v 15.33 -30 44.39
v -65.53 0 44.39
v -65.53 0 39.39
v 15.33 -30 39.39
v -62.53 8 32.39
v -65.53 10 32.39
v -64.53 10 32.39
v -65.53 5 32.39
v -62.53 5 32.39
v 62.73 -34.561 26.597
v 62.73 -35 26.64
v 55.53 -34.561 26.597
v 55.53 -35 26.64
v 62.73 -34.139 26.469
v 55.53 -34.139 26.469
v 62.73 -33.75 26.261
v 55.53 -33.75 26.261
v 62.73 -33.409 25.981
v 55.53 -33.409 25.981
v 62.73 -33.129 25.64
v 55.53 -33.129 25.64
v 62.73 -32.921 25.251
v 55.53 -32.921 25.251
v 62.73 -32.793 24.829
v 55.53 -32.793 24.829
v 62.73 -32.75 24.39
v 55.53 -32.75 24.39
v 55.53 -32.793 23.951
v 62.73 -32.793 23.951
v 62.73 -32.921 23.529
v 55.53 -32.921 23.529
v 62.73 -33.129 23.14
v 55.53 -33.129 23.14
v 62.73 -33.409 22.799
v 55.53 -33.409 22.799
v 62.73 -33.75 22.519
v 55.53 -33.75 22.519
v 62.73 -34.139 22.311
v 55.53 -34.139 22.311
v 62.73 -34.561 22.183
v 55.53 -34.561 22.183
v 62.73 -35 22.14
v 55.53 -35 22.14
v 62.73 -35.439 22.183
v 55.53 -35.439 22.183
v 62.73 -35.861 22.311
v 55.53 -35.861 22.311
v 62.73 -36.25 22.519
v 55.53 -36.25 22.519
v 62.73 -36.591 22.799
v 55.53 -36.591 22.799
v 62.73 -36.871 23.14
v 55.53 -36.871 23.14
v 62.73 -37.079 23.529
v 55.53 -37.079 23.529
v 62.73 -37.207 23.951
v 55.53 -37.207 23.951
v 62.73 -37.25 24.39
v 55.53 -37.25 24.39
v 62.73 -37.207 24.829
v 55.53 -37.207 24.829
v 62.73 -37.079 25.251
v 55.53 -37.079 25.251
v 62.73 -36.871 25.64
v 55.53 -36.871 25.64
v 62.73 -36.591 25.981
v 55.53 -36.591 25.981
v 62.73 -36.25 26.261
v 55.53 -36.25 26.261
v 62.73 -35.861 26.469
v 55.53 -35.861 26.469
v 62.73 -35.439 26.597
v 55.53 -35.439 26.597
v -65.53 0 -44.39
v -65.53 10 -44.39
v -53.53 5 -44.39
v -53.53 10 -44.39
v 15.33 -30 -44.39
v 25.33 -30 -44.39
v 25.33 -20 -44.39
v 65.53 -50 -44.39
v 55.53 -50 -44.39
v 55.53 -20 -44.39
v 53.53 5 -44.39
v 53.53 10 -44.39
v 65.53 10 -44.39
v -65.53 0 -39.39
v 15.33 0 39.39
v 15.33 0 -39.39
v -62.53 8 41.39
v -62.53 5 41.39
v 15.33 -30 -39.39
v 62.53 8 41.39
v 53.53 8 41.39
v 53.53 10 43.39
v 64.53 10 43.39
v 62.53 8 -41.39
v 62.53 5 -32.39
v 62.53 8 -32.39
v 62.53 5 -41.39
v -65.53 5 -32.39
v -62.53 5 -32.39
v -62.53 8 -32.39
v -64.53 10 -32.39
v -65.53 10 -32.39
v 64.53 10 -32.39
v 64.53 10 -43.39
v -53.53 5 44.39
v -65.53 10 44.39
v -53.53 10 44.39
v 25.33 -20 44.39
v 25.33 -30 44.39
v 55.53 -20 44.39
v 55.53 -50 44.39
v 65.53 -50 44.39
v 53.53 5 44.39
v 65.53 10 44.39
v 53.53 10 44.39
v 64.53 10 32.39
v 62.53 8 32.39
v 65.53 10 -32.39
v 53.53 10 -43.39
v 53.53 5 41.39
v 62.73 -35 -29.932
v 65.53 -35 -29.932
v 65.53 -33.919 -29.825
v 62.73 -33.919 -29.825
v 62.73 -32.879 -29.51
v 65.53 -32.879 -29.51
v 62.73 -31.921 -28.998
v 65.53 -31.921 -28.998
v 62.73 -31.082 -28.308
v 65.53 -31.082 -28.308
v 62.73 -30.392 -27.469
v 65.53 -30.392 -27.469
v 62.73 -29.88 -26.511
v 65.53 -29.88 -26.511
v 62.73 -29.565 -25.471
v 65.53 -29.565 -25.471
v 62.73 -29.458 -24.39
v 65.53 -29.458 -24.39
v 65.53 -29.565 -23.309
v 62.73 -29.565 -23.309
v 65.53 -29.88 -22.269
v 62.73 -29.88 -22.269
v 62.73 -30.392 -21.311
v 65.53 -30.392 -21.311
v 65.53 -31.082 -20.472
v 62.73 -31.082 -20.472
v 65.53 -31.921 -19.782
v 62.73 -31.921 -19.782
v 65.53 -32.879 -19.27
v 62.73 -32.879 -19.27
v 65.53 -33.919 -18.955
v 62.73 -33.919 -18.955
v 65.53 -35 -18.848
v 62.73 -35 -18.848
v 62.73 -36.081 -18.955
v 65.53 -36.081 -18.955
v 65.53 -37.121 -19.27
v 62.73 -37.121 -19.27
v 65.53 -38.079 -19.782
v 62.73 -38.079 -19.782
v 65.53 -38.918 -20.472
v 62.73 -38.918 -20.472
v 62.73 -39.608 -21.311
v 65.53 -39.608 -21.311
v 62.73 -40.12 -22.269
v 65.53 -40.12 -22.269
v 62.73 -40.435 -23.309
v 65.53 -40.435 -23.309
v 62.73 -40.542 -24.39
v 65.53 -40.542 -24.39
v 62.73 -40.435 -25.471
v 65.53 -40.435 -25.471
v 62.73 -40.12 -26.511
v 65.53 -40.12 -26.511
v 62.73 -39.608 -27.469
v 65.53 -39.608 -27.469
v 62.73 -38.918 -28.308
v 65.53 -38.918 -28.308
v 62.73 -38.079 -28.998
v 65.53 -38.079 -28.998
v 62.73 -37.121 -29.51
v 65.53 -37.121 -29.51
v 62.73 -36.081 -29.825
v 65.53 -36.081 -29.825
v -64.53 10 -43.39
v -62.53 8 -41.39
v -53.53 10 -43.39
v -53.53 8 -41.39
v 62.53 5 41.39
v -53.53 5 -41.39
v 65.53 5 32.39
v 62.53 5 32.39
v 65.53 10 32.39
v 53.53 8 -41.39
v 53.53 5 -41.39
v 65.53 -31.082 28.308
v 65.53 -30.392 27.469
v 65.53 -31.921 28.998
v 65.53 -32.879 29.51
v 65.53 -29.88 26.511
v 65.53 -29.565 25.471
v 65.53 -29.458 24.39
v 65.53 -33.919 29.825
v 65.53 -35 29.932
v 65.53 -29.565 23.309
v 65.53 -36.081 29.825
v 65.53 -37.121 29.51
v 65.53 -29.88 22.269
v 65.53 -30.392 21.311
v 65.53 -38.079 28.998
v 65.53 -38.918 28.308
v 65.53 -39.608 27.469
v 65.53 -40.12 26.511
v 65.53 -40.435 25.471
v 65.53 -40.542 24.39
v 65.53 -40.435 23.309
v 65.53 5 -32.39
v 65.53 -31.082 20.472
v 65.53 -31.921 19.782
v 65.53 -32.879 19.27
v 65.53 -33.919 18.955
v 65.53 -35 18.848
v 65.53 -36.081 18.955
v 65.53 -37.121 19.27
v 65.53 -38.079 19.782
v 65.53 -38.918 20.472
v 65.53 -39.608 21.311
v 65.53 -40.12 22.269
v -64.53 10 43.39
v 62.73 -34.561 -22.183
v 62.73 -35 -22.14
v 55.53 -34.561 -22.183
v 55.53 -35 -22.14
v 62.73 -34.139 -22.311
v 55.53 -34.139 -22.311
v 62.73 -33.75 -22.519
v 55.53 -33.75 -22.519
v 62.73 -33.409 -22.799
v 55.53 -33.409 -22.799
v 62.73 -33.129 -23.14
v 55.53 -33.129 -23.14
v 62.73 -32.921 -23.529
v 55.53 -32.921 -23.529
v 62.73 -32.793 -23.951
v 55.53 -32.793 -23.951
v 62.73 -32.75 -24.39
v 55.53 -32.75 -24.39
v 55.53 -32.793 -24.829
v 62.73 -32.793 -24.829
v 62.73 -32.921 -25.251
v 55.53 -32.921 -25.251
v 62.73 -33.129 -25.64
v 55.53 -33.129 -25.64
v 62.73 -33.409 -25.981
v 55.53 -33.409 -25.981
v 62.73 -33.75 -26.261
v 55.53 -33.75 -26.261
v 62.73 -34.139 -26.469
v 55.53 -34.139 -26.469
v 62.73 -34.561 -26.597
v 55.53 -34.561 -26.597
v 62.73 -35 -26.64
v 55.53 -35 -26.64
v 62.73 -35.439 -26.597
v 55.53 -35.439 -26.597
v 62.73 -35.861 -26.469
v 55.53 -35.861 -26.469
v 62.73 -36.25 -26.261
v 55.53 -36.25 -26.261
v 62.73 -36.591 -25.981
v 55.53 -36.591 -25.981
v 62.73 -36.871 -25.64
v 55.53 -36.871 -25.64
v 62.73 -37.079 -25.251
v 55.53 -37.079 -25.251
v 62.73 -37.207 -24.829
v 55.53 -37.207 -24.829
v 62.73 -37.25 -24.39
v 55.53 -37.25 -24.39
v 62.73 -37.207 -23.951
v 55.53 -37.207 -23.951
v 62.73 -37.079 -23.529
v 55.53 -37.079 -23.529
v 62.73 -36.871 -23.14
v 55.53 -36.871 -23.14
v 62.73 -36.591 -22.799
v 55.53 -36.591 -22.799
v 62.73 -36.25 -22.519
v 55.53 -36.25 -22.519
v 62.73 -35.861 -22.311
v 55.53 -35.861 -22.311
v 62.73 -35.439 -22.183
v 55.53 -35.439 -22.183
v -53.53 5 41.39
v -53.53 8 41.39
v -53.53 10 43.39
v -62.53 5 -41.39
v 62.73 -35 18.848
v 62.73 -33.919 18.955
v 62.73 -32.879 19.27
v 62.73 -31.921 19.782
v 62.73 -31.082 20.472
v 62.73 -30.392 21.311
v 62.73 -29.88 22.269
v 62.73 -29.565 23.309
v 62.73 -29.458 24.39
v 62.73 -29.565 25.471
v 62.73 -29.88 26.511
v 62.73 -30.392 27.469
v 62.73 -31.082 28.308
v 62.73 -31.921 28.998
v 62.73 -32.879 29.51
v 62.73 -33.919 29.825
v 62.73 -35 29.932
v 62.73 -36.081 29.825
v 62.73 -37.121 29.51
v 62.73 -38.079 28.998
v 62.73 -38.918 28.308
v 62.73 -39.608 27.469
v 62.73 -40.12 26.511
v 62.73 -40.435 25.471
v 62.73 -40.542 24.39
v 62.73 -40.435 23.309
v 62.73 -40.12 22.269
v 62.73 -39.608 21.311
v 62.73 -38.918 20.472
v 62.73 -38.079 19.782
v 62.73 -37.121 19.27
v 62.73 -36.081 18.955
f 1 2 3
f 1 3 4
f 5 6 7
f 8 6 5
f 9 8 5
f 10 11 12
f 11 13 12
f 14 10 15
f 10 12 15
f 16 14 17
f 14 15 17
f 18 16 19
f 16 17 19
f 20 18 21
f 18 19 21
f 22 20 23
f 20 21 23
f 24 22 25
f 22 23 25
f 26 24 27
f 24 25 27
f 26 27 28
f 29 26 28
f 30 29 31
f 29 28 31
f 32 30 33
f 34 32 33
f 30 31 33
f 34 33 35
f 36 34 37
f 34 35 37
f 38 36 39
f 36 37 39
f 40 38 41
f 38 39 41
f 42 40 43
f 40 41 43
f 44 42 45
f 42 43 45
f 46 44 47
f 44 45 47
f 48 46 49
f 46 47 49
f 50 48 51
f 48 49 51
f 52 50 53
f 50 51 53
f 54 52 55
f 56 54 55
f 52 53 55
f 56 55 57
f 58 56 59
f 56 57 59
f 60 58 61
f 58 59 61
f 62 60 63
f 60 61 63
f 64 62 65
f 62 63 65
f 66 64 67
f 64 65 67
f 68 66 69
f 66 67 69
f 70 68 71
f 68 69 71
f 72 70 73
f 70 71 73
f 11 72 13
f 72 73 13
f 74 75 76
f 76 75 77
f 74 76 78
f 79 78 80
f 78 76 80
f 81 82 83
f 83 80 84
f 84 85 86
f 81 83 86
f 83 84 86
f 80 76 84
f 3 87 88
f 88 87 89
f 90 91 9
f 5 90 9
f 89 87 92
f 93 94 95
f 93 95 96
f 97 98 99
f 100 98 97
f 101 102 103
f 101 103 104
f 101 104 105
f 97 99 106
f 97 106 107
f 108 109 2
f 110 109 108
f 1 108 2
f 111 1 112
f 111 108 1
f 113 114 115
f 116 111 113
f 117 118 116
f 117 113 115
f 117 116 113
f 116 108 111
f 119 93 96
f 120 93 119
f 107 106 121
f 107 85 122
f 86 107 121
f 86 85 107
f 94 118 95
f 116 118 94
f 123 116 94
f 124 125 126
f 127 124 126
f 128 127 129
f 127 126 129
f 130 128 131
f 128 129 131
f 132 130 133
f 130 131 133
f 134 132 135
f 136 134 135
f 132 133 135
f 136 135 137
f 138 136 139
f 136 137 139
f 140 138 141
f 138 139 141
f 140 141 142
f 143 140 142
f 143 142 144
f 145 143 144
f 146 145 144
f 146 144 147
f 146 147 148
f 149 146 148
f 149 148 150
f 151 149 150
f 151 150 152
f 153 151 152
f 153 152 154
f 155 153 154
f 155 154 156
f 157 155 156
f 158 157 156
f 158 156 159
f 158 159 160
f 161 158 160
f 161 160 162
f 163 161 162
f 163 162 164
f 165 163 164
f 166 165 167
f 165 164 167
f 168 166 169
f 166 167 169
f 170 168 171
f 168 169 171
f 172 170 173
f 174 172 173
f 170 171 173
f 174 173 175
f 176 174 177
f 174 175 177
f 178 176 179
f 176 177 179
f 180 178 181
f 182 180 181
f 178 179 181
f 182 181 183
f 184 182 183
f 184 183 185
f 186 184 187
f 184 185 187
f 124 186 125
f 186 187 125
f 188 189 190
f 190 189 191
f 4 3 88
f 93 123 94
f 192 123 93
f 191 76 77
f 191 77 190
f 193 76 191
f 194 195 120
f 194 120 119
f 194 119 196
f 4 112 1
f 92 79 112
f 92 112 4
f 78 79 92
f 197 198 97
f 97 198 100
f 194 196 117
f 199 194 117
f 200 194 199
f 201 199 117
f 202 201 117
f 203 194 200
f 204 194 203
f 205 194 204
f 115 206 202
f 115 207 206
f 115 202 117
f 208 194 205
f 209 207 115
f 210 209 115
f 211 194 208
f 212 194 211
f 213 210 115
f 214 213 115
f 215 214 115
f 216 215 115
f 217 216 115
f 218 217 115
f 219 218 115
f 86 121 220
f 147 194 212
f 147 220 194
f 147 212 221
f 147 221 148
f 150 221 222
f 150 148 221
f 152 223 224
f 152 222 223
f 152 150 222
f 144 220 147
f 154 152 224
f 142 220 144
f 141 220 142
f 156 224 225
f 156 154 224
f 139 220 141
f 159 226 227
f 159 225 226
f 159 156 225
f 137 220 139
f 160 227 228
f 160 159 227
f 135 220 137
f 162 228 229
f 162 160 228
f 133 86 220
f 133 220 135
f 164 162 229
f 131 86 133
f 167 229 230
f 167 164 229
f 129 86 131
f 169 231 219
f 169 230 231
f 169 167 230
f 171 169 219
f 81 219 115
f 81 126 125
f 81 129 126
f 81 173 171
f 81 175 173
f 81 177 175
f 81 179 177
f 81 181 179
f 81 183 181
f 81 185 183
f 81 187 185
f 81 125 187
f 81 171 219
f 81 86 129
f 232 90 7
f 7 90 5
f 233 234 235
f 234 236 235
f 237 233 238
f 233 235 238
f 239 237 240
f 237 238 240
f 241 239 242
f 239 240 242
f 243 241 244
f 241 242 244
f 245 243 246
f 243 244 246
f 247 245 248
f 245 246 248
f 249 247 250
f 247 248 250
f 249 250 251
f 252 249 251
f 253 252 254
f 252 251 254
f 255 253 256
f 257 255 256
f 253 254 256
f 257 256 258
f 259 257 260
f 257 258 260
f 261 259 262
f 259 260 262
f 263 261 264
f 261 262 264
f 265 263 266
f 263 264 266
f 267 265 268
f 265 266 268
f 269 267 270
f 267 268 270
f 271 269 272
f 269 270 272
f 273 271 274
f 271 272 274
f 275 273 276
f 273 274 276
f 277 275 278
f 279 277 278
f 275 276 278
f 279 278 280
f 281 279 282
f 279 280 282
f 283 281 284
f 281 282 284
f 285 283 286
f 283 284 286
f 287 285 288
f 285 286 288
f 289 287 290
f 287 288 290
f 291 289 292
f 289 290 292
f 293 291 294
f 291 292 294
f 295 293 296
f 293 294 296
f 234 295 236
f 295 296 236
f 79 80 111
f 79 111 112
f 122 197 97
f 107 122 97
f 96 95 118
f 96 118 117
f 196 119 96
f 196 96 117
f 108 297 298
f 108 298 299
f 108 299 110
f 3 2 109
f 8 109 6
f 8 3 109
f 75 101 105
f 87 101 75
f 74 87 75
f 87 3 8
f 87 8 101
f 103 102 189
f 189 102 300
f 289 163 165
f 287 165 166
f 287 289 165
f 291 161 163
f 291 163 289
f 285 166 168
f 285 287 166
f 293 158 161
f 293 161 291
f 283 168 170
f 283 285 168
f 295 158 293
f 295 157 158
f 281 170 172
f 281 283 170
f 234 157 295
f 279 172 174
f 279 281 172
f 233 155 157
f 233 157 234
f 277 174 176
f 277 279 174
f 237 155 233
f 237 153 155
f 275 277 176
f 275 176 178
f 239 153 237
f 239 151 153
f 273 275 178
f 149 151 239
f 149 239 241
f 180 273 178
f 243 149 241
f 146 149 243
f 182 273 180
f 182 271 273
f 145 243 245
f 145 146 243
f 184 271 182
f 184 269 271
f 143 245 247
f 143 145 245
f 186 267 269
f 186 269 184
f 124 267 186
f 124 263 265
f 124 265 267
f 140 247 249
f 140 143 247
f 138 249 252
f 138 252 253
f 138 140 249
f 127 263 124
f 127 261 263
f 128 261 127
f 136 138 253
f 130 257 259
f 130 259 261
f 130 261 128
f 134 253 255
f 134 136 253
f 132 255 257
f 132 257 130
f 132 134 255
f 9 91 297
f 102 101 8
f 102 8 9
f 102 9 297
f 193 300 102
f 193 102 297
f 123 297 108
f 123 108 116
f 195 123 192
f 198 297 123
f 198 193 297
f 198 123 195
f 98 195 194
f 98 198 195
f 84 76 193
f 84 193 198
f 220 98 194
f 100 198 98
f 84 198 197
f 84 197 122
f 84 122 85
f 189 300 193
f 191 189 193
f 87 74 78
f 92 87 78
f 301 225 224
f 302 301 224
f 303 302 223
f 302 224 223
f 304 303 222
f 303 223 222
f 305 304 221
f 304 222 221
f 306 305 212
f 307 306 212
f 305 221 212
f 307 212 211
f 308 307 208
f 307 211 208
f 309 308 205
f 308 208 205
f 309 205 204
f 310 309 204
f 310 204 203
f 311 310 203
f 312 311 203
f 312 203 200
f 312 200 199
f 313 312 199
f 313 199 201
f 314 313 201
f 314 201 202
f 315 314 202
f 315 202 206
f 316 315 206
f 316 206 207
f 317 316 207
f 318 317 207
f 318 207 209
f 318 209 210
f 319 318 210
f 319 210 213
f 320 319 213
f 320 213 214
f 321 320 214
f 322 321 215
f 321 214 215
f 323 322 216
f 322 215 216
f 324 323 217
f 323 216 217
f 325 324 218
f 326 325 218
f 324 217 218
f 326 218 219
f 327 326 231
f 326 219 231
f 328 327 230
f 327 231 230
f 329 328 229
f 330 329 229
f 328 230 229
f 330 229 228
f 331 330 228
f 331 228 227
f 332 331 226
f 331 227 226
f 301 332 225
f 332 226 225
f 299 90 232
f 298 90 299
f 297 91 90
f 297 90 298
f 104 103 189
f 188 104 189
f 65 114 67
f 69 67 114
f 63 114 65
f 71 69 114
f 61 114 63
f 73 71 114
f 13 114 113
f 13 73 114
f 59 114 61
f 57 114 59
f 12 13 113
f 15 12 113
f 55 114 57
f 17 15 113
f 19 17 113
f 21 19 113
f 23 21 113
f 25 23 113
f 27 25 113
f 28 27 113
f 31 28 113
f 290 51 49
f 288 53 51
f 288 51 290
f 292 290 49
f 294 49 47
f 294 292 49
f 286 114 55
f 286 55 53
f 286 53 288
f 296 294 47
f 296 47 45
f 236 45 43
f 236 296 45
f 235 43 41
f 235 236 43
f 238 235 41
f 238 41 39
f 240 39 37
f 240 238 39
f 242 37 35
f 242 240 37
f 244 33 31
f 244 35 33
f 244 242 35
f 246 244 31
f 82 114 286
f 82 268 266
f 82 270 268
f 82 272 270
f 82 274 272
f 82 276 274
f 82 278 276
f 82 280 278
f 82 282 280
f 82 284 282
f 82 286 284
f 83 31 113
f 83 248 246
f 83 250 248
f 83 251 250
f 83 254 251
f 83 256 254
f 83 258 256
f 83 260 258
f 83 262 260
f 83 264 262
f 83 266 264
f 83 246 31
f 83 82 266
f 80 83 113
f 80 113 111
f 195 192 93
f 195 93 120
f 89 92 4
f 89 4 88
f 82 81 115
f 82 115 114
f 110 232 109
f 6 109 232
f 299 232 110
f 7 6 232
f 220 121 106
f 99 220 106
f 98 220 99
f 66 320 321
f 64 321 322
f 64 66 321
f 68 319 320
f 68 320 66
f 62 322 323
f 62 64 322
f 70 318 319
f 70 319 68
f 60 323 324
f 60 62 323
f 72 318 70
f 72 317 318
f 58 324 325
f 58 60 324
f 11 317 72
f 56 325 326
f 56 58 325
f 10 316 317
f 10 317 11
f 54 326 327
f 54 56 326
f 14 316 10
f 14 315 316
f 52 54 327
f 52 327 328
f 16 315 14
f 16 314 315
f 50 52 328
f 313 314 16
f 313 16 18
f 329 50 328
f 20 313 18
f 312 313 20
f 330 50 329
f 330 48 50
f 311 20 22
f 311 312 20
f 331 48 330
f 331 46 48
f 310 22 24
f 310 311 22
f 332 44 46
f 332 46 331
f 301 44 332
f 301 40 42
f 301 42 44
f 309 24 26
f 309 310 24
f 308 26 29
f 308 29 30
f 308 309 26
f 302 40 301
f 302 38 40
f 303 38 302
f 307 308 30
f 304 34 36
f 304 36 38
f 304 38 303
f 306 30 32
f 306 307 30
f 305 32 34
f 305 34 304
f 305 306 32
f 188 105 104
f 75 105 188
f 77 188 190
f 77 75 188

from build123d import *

# Parameters (mm, degrees)
SKETCH1_W                                    = 131.06
SKETCH1_H                                    = 88.78
BOSS_EXTRUDE1_DEPTH                          = 5
SKETCH2_W                                    = 131.06
SKETCH2_H                                    = 88.78
SKETCH2_W_2                                  = 125.06
SKETCH2_H_2                                  = 82.78
BOSS_EXTRUDE2_DEPTH                          = 5
CHAMFER1_SIZE                                = 2
CUT_EXTRUDE1_DEPTH                           = 80.307332574
BOSS_EXTRUDE3_START                          = -44.39
BOSS_EXTRUDE3_DEPTH                          = 88.78
BOSS_EXTRUDE4_DEPTH                          = 5
CBORE_FOR_M4_HEX_HEAD_CAP_SCREW1_D           = 4.5
CBORE_FOR_M4_HEX_HEAD_CAP_SCREW1_CBORE_D     = 11.083
CBORE_FOR_M4_HEX_HEAD_CAP_SCREW1_CBORE_DEPTH = 2.8


with BuildPart() as part:
    # Sketch1 → Boss-Extrude1 (new body)
    with BuildSketch(Plane(origin=(0, 0, 0), x_dir=(1, 0, 0), z_dir=(0, 1, 0))):
        Rectangle(SKETCH1_W, SKETCH1_H)
    extrude(amount=BOSS_EXTRUDE1_DEPTH)

    # Sketch2 → Boss-Extrude2 (add)
    with BuildSketch(Plane(origin=(0, 5, 0), x_dir=(1, 0, 0), z_dir=(0, 1, 0))):
        Rectangle(SKETCH2_W, SKETCH2_H)
        Rectangle(SKETCH2_W_2, SKETCH2_H_2, mode=Mode.SUBTRACT)
    extrude(amount=BOSS_EXTRUDE2_DEPTH)

    # Chamfer1
    chamfer1_edges = [part.edges().sort_by_distance(p)[0] for p in [
        (62.53, 10, 0),
        (0, 10, -41.39),
        (-62.53, 10, 0),
        (0, 10, 41.39),
    ]]
    chamfer(chamfer1_edges, length=CHAMFER1_SIZE)

    # Sketch3 → Cut-Extrude1 (cut, through all)
    with BuildSketch(Plane(origin=(0, 5, 0), x_dir=(1, 0, 0), z_dir=(0, 1, 0))):
        Polygon((-65.53, 32.39), (-65.53, -32.39), (-53.53, -32.39), (-53.53, -44.39), (53.53, -44.39), (53.53, -32.39), (65.53, -32.39), (65.53, 32.39), (53.53, 32.39), (53.53, 44.39), (-53.53, 44.39), (-53.53, 32.39), align=None)
    extrude(amount=CUT_EXTRUDE1_DEPTH, mode=Mode.SUBTRACT)

    # Sketch4 → Boss-Extrude3 (add)
    with BuildSketch(Plane.XY.offset(BOSS_EXTRUDE3_START)):
        Polygon((65.53, 0), (65.53, -50), (55.53, -50), (55.53, -20), (25.33, -20), (25.33, -30), (15.33, -30), (15.33, 0), align=None)
    extrude(amount=BOSS_EXTRUDE3_DEPTH)

    # Sketch5 → Boss-Extrude4 (add)
    with BuildSketch(Plane.XY.offset(44.39)):
        Polygon((-65.53, 0), (15.33, -30), (15.33, 0), align=None)
    boss_extrude4 = extrude(amount=-BOSS_EXTRUDE4_DEPTH)

    # Mirror1: Boss-Extrude4 across plane
    add(boss_extrude4.mirror(Plane.XY))

    # CBORE for M4 Hex Head Cap Screw1 (through all)
    with Locations(Plane(origin=(65.53, 0, 0), x_dir=(0, 0, -1), z_dir=(1, 0, 0))):
        with Locations((-24.39, -35), (24.39, -35)):
            CounterBoreHole(CBORE_FOR_M4_HEX_HEAD_CAP_SCREW1_D / 2, CBORE_FOR_M4_HEX_HEAD_CAP_SCREW1_CBORE_D / 2, CBORE_FOR_M4_HEX_HEAD_CAP_SCREW1_CBORE_DEPTH)


solid = part.part
